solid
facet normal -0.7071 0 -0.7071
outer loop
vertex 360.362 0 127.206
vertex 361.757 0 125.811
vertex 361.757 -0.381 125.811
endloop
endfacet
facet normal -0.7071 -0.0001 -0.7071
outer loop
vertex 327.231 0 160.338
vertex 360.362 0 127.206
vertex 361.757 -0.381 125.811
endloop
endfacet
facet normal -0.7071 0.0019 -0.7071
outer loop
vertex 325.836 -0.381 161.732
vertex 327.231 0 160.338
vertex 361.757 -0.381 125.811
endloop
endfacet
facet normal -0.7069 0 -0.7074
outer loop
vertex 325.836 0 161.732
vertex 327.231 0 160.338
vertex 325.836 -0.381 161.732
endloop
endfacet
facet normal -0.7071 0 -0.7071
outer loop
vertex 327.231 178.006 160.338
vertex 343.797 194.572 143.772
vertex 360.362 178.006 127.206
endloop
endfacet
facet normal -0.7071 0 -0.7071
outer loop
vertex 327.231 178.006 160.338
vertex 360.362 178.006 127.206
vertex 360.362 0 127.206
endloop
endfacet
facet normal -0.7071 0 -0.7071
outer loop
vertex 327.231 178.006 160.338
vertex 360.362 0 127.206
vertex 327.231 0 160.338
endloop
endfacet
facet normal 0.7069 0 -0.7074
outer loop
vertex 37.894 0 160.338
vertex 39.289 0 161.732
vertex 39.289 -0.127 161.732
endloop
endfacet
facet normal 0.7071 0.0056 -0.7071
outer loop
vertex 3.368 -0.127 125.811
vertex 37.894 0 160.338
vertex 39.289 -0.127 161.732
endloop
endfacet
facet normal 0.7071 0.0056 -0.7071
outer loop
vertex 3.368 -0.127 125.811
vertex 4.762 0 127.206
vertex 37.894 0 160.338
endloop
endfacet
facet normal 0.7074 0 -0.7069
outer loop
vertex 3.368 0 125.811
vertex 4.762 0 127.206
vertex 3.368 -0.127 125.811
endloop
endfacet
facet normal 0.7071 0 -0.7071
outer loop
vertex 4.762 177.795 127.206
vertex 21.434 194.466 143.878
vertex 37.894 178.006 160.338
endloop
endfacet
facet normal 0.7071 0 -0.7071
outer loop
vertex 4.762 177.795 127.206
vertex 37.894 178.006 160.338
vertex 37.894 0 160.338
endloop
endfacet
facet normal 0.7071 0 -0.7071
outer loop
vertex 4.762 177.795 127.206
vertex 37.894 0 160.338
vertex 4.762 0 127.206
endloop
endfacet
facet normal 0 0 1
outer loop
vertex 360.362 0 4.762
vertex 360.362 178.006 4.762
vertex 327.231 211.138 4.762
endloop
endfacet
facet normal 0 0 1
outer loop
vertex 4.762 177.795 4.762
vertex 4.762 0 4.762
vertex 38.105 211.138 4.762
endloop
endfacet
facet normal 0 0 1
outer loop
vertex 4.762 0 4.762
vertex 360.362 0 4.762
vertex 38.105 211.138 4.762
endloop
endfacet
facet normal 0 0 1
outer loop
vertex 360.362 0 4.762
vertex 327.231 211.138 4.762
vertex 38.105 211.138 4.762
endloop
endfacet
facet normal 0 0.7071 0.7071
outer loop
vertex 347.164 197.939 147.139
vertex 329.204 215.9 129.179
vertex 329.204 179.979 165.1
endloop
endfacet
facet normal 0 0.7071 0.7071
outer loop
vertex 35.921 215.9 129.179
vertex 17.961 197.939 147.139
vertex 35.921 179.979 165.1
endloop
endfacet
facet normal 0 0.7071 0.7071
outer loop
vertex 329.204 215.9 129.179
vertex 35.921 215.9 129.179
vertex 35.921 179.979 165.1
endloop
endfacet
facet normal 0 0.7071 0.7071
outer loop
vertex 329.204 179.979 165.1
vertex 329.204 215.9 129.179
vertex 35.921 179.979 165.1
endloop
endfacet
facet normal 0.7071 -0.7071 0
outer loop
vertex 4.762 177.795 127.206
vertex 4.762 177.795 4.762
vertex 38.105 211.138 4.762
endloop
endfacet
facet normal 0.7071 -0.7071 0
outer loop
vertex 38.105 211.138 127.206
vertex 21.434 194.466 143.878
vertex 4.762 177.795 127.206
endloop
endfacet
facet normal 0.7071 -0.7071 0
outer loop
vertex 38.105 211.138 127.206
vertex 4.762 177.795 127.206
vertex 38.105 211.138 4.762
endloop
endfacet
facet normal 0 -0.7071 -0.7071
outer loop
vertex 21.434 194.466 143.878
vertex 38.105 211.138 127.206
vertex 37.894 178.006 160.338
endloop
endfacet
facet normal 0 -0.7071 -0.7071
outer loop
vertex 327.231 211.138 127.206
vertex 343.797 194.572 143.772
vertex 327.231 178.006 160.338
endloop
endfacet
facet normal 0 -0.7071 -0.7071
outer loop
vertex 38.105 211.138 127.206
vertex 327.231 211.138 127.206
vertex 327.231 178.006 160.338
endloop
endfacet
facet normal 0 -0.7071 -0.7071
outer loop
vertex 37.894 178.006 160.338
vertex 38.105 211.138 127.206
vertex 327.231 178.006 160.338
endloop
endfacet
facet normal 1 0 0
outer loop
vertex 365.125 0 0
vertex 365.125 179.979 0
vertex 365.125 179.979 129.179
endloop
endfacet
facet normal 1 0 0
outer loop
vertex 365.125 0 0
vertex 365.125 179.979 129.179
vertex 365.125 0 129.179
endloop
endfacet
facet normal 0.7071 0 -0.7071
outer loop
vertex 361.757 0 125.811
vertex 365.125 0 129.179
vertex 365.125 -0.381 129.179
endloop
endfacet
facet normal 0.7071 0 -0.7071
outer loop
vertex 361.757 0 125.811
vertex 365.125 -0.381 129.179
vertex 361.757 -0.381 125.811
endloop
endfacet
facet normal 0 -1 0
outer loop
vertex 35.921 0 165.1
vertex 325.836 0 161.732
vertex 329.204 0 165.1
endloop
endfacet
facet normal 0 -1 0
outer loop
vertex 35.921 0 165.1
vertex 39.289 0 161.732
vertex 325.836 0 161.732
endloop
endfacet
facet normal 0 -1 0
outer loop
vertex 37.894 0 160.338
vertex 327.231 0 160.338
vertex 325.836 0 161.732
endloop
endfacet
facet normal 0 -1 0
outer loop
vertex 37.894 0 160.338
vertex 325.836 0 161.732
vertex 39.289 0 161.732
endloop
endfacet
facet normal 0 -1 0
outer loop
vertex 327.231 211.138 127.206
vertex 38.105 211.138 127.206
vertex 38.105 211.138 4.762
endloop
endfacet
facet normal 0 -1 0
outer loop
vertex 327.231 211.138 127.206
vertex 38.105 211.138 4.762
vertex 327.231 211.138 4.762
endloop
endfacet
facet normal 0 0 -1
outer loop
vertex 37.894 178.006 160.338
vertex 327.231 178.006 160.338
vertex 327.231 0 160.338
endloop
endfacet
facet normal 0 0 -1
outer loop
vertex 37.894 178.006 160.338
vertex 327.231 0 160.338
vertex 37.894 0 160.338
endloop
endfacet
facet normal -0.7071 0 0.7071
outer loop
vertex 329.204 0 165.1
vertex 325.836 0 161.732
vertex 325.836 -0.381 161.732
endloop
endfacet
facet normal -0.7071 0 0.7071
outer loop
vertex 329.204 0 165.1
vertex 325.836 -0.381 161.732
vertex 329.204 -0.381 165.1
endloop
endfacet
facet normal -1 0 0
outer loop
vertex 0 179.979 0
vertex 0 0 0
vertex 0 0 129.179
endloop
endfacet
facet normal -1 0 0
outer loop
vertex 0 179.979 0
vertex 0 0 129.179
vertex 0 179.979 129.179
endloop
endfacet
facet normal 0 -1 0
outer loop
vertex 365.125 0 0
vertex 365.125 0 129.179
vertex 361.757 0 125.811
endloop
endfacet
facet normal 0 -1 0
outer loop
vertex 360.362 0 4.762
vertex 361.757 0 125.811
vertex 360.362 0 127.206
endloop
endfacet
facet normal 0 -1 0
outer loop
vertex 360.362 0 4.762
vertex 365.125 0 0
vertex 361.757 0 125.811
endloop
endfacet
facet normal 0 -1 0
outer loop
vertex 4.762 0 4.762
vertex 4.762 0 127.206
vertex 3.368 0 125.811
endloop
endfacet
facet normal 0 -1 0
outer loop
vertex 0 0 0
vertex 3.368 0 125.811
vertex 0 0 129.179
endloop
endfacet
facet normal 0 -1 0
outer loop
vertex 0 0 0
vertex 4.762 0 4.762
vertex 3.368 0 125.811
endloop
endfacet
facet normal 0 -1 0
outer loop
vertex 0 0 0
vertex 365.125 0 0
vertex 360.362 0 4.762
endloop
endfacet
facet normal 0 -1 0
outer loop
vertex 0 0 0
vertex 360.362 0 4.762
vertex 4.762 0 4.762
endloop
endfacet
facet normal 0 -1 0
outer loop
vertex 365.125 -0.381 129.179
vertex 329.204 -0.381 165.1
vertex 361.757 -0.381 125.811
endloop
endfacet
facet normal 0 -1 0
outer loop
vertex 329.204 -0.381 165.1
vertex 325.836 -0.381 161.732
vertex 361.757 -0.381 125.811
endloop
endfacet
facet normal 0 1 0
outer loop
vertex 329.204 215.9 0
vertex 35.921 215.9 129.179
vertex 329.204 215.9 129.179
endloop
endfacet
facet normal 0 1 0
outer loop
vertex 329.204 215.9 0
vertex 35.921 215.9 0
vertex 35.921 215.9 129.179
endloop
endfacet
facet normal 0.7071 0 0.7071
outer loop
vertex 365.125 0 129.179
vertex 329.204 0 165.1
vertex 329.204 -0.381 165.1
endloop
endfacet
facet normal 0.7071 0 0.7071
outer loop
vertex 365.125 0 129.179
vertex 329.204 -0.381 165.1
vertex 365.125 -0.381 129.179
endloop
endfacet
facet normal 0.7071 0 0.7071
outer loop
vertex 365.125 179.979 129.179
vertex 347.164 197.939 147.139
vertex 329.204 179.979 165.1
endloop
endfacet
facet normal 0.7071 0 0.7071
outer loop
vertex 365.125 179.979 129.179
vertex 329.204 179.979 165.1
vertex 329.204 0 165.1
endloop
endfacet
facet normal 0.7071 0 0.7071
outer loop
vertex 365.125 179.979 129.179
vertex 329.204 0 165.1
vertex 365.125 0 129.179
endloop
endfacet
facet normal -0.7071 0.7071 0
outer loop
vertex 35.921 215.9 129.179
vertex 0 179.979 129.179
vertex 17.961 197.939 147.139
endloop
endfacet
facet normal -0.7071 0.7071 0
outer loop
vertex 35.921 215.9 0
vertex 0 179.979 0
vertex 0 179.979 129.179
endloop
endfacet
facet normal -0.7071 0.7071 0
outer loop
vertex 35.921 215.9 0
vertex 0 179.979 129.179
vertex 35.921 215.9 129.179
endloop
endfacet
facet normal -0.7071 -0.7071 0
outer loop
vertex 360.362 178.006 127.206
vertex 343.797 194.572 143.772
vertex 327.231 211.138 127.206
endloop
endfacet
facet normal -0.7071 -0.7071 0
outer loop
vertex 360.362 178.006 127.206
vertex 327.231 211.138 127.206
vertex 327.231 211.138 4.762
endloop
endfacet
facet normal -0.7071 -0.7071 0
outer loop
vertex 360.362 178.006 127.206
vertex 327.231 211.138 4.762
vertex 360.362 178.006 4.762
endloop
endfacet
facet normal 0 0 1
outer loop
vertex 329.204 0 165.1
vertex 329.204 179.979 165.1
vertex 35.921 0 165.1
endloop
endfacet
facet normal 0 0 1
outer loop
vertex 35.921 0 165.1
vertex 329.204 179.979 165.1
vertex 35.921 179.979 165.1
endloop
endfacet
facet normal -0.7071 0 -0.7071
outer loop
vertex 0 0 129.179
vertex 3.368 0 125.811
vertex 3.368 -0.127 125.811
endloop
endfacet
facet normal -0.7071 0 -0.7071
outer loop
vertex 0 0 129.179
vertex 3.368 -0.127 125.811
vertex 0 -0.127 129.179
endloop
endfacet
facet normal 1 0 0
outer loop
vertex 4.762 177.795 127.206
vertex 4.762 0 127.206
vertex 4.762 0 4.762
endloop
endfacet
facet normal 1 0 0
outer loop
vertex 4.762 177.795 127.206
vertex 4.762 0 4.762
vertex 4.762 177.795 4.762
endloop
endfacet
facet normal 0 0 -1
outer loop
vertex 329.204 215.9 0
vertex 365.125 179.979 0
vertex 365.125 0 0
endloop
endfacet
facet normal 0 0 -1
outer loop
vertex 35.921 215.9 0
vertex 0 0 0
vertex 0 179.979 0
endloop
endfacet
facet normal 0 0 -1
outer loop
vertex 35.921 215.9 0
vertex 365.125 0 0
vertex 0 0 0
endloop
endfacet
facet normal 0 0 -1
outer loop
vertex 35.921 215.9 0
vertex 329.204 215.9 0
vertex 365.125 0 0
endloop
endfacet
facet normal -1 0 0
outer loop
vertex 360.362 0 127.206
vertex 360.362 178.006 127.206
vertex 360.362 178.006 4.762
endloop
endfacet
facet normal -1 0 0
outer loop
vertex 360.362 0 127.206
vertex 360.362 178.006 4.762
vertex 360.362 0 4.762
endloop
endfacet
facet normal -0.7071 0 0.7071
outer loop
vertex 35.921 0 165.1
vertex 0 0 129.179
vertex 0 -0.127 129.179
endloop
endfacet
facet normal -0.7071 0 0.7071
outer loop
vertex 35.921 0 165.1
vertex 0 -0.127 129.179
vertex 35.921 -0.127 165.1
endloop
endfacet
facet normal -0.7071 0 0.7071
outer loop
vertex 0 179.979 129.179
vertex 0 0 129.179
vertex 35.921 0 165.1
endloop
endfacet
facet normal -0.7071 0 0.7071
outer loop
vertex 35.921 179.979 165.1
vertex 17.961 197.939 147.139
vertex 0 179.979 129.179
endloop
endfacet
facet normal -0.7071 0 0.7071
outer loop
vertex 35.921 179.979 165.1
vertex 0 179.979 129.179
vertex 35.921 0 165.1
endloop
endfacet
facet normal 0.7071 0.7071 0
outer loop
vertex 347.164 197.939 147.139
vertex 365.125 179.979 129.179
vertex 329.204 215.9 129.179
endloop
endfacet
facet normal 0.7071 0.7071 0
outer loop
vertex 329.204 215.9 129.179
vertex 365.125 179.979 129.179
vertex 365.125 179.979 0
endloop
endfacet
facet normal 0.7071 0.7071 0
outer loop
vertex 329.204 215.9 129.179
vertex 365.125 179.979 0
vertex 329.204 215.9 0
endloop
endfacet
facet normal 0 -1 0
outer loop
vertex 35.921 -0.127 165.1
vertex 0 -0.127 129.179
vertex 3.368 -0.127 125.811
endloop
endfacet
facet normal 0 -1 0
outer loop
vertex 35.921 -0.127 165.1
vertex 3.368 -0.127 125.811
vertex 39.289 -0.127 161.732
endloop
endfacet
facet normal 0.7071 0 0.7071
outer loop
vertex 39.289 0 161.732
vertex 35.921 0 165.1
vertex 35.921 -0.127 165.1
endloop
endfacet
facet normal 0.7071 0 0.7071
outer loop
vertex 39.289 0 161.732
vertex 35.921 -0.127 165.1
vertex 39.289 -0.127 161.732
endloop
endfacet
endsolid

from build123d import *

# Parameters (mm, degrees)
BOSS_EXTRUDE3_DEPTH      = 165.1
CUT_EXTRUDE1_DEPTH       = 160.3375
BOSS_EXTRUDE4_DEPTH      = 4.7625
CUT_EXTRUDE2_DEPTH       = 11.176
CUT_EXTRUDE2_DEPTH_BACK  = 387.2865
BOSS_EXTRUDE5_DEPTH      = 365.125
CUT_EXTRUDE3_DEPTH       = 365.125
CUT_EXTRUDE4_DEPTH       = 365.125
BOSS_EXTRUDE6_DEPTH      = 1.27
BOSS_EXTRUDE6_DEPTH_BACK = 216.027
CUT_EXTRUDE5_DEPTH       = 398.907
CUT_EXTRUDE7_DEPTH       = 398.907
CUT_EXTRUDE8_DEPTH       = 216.281
BOSS_EXTRUDE7_DEPTH      = 216.281
CUT_EXTRUDE9_DEPTH       = 216.281
CUT_EXTRUDE10_DEPTH      = 2540


with BuildPart() as part:
    # Sketch13 → Boss-Extrude3 (new body)
    with BuildSketch(Plane.XY):
        Polygon((0, 0), (0, 179.978975516), (35.921024484, 215.9), (329.203975516, 215.9), (365.125, 179.978975516), (365.125, 0), align=None)
    extrude(amount=BOSS_EXTRUDE3_DEPTH)

    # Sketch14 → Cut-Extrude1 (cut)
    with BuildSketch(Plane.XY.offset(165.1)):
        Polygon((4.7625, 0), (4.7625, 177.794773237), (38.105226763, 211.1375), (327.231283425, 211.1375), (360.3625, 178.006283425), (360.3625, 0), align=None)
    extrude(amount=-CUT_EXTRUDE1_DEPTH, mode=Mode.SUBTRACT)

    # Sketch15 → Boss-Extrude4 (add)
    with BuildSketch(Plane.XY.offset(165.1)):
        Polygon((0, 0), (0, 179.978975516), (35.921024484, 215.9), (329.203975516, 215.9), (365.125, 179.978975516), (365.125, 0), align=None)
    extrude(amount=-BOSS_EXTRUDE4_DEPTH)

    # Sketch16 → Cut-Extrude2 (cut, two sides)
    with BuildSketch(Plane(origin=(365.125, 0, 0), x_dir=(0, 0, -1), z_dir=(1, 0, 0))) as cut_extrude2_sk:
        Polygon((-165.1, 179.978975516), (-129.178975516, 215.9), (-165.1, 215.9), align=None)
    extrude(amount=CUT_EXTRUDE2_DEPTH, mode=Mode.SUBTRACT)
    extrude(cut_extrude2_sk.sketch, amount=-CUT_EXTRUDE2_DEPTH_BACK, mode=Mode.SUBTRACT)

    # Sketch17 → Boss-Extrude5 (add)
    with BuildSketch(Plane(origin=(365.125, 0, 0), x_dir=(0, 0, -1), z_dir=(1, 0, 0))):
        Polygon((-165.1, 179.978975516), (-129.178975516, 215.9), (-125.81137947, 212.532403955), (-161.732403955, 176.61137947), align=None)
    extrude(amount=-BOSS_EXTRUDE5_DEPTH)

    # Sketch18 → Cut-Extrude3 (cut)
    with BuildSketch(Plane(origin=(0, 0, 0), x_dir=(-1, 0, 0), z_dir=(0, 0, -1))):
        Polygon((-365.125, 179.978975516), (-329.203975516, 215.9), (-365.125, 215.9), align=None)
        Polygon((-35.921024484, 215.9), (0, 215.9), (0, 179.978975516), align=None)
    extrude(amount=-CUT_EXTRUDE3_DEPTH, mode=Mode.SUBTRACT)

    # Sketch19 → Cut-Extrude4 (cut)
    with BuildSketch(Plane(origin=(0, 215.9, 0), x_dir=(1, 0, 0), z_dir=(0, 1, 0))):
        Polygon((0, -129.178975516), (35.921024484, -165.1), (0, -165.1), align=None)
    extrude(amount=-CUT_EXTRUDE4_DEPTH, mode=Mode.SUBTRACT)

    # Sketch20 → Boss-Extrude6 (add, two sides)
    with BuildSketch(Plane(origin=(0, 215.9, 0), x_dir=(1, 0, 0), z_dir=(0, 1, 0))) as boss_extrude6_sk:
        Polygon((0, -129.178975516), (35.921024484, -165.1), (39.28862053, -161.732403955), (3.367596045, -125.81137947), align=None)
    extrude(amount=BOSS_EXTRUDE6_DEPTH)
    extrude(boss_extrude6_sk.sketch, amount=-BOSS_EXTRUDE6_DEPTH_BACK)

    # Sketch21 → Cut-Extrude5 (cut)
    with BuildSketch(Plane(origin=(365.125, 0, 0), x_dir=(0, 0, -1), z_dir=(1, 0, 0))):
        Polygon((-165.1, 179.978975516), (-129.178975516, 215.9), (-125.060291361, 215.9), (-125.060291361, 220.601518186), (-193.24025866, 220.601518186), (-185.719207112, 179.978975516), align=None)
    extrude(amount=-CUT_EXTRUDE5_DEPTH, mode=Mode.SUBTRACT)

    # Sketch22 → Cut-Extrude7 (cut)
    with BuildSketch(Plane(origin=(0, 0, 0), x_dir=(-1, 0, 0), z_dir=(0, 0, -1))):
        Polygon((0, 179.978975516), (-35.921024484, 215.9), (-15.545950188, 236.275074296), (20.375074296, 200.354049812), align=None)
    extrude(amount=-CUT_EXTRUDE7_DEPTH, mode=Mode.SUBTRACT)

    # Sketch24 → Cut-Extrude8 (cut)
    with BuildSketch(Plane(origin=(0, 215.9, 0), x_dir=(1, 0, 0), z_dir=(0, 1, 0))):
        Polygon((329.203975516, -165.1), (365.125, -129.178975516), (387.404902752, -151.458878267), (351.483878267, -187.379902752), align=None)
    extrude(amount=-CUT_EXTRUDE8_DEPTH, mode=Mode.SUBTRACT)

    # Sketch25 → Boss-Extrude7 (add)
    with BuildSketch(Plane(origin=(0, 215.9, 0), x_dir=(1, 0, 0), z_dir=(0, 1, 0))):
        Polygon((329.203975516, -165.1), (365.125, -129.178975516), (361.757403955, -125.81137947), (325.83637947, -161.732403955), align=None)
    extrude(amount=-BOSS_EXTRUDE7_DEPTH)

    # Sketch26 → Cut-Extrude9 (cut)
    with BuildSketch(Plane(origin=(0, 0, 0), x_dir=(-1, 0, 0), z_dir=(0, 0, -1))):
        Polygon((-365.125, 179.978975516), (-329.203975516, 215.9), (-357.158082667, 243.854107151), (-393.079107151, 207.933082667), align=None)
    extrude(amount=-CUT_EXTRUDE9_DEPTH, mode=Mode.SUBTRACT)

    # Sketch27 → Cut-Extrude10 (cut)
    with BuildSketch(Plane.ZY):
        Polygon((129.178975516, 215.9), (165.1, 179.978975516), (185.560673149, 200.439648664), (149.639648664, 236.360673149), align=None)
    extrude(amount=-CUT_EXTRUDE10_DEPTH, mode=Mode.SUBTRACT)


solid = part.part
